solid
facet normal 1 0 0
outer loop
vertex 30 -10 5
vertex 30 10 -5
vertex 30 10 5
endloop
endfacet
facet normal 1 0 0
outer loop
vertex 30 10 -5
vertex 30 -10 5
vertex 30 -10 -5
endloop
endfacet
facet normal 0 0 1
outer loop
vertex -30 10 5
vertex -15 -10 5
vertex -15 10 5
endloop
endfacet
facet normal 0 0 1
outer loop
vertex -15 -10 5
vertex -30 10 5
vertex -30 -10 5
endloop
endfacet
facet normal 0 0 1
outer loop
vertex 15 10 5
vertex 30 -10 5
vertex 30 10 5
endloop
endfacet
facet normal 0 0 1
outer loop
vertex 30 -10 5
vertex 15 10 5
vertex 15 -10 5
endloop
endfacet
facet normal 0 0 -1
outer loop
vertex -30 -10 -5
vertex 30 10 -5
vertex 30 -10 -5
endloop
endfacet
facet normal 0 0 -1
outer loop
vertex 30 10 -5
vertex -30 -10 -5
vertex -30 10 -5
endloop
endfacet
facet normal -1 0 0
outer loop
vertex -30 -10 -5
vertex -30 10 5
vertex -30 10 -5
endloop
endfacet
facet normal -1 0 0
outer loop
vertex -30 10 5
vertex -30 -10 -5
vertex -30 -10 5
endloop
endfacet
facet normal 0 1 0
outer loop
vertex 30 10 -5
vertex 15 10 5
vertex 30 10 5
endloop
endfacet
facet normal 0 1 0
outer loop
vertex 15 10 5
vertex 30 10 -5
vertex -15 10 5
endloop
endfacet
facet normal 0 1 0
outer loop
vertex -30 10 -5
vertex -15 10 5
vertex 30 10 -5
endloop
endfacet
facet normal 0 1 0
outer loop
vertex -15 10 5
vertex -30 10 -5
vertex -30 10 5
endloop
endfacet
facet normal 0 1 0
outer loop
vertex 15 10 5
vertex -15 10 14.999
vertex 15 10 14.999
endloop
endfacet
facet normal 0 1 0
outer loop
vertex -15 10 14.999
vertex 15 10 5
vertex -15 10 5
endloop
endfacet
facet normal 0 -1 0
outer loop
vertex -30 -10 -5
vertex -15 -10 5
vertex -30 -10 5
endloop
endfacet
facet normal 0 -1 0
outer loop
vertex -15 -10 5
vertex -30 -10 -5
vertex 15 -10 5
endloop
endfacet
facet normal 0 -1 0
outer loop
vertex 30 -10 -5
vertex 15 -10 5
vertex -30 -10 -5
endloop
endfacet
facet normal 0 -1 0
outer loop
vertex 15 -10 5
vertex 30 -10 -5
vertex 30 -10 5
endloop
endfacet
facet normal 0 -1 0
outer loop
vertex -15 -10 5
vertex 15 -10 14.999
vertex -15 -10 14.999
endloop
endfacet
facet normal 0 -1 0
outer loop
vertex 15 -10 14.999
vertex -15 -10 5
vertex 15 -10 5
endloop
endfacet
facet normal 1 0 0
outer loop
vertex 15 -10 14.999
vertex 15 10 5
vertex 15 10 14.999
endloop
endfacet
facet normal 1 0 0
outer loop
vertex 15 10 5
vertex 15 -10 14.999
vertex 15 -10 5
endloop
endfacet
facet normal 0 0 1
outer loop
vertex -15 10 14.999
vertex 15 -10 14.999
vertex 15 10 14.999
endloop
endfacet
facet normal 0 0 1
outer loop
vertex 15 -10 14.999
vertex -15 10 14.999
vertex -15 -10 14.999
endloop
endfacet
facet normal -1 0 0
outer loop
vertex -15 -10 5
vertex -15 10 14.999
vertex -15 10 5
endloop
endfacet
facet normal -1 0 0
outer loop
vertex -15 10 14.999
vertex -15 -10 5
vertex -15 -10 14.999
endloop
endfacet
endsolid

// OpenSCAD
// (width,depth,height)
// a small overlap 
// of about 0.001 - 0.002
cube([60,20,10],center=true);
translate([0, 0, 10-0.001])
    cube([30,20,10],center=true);
